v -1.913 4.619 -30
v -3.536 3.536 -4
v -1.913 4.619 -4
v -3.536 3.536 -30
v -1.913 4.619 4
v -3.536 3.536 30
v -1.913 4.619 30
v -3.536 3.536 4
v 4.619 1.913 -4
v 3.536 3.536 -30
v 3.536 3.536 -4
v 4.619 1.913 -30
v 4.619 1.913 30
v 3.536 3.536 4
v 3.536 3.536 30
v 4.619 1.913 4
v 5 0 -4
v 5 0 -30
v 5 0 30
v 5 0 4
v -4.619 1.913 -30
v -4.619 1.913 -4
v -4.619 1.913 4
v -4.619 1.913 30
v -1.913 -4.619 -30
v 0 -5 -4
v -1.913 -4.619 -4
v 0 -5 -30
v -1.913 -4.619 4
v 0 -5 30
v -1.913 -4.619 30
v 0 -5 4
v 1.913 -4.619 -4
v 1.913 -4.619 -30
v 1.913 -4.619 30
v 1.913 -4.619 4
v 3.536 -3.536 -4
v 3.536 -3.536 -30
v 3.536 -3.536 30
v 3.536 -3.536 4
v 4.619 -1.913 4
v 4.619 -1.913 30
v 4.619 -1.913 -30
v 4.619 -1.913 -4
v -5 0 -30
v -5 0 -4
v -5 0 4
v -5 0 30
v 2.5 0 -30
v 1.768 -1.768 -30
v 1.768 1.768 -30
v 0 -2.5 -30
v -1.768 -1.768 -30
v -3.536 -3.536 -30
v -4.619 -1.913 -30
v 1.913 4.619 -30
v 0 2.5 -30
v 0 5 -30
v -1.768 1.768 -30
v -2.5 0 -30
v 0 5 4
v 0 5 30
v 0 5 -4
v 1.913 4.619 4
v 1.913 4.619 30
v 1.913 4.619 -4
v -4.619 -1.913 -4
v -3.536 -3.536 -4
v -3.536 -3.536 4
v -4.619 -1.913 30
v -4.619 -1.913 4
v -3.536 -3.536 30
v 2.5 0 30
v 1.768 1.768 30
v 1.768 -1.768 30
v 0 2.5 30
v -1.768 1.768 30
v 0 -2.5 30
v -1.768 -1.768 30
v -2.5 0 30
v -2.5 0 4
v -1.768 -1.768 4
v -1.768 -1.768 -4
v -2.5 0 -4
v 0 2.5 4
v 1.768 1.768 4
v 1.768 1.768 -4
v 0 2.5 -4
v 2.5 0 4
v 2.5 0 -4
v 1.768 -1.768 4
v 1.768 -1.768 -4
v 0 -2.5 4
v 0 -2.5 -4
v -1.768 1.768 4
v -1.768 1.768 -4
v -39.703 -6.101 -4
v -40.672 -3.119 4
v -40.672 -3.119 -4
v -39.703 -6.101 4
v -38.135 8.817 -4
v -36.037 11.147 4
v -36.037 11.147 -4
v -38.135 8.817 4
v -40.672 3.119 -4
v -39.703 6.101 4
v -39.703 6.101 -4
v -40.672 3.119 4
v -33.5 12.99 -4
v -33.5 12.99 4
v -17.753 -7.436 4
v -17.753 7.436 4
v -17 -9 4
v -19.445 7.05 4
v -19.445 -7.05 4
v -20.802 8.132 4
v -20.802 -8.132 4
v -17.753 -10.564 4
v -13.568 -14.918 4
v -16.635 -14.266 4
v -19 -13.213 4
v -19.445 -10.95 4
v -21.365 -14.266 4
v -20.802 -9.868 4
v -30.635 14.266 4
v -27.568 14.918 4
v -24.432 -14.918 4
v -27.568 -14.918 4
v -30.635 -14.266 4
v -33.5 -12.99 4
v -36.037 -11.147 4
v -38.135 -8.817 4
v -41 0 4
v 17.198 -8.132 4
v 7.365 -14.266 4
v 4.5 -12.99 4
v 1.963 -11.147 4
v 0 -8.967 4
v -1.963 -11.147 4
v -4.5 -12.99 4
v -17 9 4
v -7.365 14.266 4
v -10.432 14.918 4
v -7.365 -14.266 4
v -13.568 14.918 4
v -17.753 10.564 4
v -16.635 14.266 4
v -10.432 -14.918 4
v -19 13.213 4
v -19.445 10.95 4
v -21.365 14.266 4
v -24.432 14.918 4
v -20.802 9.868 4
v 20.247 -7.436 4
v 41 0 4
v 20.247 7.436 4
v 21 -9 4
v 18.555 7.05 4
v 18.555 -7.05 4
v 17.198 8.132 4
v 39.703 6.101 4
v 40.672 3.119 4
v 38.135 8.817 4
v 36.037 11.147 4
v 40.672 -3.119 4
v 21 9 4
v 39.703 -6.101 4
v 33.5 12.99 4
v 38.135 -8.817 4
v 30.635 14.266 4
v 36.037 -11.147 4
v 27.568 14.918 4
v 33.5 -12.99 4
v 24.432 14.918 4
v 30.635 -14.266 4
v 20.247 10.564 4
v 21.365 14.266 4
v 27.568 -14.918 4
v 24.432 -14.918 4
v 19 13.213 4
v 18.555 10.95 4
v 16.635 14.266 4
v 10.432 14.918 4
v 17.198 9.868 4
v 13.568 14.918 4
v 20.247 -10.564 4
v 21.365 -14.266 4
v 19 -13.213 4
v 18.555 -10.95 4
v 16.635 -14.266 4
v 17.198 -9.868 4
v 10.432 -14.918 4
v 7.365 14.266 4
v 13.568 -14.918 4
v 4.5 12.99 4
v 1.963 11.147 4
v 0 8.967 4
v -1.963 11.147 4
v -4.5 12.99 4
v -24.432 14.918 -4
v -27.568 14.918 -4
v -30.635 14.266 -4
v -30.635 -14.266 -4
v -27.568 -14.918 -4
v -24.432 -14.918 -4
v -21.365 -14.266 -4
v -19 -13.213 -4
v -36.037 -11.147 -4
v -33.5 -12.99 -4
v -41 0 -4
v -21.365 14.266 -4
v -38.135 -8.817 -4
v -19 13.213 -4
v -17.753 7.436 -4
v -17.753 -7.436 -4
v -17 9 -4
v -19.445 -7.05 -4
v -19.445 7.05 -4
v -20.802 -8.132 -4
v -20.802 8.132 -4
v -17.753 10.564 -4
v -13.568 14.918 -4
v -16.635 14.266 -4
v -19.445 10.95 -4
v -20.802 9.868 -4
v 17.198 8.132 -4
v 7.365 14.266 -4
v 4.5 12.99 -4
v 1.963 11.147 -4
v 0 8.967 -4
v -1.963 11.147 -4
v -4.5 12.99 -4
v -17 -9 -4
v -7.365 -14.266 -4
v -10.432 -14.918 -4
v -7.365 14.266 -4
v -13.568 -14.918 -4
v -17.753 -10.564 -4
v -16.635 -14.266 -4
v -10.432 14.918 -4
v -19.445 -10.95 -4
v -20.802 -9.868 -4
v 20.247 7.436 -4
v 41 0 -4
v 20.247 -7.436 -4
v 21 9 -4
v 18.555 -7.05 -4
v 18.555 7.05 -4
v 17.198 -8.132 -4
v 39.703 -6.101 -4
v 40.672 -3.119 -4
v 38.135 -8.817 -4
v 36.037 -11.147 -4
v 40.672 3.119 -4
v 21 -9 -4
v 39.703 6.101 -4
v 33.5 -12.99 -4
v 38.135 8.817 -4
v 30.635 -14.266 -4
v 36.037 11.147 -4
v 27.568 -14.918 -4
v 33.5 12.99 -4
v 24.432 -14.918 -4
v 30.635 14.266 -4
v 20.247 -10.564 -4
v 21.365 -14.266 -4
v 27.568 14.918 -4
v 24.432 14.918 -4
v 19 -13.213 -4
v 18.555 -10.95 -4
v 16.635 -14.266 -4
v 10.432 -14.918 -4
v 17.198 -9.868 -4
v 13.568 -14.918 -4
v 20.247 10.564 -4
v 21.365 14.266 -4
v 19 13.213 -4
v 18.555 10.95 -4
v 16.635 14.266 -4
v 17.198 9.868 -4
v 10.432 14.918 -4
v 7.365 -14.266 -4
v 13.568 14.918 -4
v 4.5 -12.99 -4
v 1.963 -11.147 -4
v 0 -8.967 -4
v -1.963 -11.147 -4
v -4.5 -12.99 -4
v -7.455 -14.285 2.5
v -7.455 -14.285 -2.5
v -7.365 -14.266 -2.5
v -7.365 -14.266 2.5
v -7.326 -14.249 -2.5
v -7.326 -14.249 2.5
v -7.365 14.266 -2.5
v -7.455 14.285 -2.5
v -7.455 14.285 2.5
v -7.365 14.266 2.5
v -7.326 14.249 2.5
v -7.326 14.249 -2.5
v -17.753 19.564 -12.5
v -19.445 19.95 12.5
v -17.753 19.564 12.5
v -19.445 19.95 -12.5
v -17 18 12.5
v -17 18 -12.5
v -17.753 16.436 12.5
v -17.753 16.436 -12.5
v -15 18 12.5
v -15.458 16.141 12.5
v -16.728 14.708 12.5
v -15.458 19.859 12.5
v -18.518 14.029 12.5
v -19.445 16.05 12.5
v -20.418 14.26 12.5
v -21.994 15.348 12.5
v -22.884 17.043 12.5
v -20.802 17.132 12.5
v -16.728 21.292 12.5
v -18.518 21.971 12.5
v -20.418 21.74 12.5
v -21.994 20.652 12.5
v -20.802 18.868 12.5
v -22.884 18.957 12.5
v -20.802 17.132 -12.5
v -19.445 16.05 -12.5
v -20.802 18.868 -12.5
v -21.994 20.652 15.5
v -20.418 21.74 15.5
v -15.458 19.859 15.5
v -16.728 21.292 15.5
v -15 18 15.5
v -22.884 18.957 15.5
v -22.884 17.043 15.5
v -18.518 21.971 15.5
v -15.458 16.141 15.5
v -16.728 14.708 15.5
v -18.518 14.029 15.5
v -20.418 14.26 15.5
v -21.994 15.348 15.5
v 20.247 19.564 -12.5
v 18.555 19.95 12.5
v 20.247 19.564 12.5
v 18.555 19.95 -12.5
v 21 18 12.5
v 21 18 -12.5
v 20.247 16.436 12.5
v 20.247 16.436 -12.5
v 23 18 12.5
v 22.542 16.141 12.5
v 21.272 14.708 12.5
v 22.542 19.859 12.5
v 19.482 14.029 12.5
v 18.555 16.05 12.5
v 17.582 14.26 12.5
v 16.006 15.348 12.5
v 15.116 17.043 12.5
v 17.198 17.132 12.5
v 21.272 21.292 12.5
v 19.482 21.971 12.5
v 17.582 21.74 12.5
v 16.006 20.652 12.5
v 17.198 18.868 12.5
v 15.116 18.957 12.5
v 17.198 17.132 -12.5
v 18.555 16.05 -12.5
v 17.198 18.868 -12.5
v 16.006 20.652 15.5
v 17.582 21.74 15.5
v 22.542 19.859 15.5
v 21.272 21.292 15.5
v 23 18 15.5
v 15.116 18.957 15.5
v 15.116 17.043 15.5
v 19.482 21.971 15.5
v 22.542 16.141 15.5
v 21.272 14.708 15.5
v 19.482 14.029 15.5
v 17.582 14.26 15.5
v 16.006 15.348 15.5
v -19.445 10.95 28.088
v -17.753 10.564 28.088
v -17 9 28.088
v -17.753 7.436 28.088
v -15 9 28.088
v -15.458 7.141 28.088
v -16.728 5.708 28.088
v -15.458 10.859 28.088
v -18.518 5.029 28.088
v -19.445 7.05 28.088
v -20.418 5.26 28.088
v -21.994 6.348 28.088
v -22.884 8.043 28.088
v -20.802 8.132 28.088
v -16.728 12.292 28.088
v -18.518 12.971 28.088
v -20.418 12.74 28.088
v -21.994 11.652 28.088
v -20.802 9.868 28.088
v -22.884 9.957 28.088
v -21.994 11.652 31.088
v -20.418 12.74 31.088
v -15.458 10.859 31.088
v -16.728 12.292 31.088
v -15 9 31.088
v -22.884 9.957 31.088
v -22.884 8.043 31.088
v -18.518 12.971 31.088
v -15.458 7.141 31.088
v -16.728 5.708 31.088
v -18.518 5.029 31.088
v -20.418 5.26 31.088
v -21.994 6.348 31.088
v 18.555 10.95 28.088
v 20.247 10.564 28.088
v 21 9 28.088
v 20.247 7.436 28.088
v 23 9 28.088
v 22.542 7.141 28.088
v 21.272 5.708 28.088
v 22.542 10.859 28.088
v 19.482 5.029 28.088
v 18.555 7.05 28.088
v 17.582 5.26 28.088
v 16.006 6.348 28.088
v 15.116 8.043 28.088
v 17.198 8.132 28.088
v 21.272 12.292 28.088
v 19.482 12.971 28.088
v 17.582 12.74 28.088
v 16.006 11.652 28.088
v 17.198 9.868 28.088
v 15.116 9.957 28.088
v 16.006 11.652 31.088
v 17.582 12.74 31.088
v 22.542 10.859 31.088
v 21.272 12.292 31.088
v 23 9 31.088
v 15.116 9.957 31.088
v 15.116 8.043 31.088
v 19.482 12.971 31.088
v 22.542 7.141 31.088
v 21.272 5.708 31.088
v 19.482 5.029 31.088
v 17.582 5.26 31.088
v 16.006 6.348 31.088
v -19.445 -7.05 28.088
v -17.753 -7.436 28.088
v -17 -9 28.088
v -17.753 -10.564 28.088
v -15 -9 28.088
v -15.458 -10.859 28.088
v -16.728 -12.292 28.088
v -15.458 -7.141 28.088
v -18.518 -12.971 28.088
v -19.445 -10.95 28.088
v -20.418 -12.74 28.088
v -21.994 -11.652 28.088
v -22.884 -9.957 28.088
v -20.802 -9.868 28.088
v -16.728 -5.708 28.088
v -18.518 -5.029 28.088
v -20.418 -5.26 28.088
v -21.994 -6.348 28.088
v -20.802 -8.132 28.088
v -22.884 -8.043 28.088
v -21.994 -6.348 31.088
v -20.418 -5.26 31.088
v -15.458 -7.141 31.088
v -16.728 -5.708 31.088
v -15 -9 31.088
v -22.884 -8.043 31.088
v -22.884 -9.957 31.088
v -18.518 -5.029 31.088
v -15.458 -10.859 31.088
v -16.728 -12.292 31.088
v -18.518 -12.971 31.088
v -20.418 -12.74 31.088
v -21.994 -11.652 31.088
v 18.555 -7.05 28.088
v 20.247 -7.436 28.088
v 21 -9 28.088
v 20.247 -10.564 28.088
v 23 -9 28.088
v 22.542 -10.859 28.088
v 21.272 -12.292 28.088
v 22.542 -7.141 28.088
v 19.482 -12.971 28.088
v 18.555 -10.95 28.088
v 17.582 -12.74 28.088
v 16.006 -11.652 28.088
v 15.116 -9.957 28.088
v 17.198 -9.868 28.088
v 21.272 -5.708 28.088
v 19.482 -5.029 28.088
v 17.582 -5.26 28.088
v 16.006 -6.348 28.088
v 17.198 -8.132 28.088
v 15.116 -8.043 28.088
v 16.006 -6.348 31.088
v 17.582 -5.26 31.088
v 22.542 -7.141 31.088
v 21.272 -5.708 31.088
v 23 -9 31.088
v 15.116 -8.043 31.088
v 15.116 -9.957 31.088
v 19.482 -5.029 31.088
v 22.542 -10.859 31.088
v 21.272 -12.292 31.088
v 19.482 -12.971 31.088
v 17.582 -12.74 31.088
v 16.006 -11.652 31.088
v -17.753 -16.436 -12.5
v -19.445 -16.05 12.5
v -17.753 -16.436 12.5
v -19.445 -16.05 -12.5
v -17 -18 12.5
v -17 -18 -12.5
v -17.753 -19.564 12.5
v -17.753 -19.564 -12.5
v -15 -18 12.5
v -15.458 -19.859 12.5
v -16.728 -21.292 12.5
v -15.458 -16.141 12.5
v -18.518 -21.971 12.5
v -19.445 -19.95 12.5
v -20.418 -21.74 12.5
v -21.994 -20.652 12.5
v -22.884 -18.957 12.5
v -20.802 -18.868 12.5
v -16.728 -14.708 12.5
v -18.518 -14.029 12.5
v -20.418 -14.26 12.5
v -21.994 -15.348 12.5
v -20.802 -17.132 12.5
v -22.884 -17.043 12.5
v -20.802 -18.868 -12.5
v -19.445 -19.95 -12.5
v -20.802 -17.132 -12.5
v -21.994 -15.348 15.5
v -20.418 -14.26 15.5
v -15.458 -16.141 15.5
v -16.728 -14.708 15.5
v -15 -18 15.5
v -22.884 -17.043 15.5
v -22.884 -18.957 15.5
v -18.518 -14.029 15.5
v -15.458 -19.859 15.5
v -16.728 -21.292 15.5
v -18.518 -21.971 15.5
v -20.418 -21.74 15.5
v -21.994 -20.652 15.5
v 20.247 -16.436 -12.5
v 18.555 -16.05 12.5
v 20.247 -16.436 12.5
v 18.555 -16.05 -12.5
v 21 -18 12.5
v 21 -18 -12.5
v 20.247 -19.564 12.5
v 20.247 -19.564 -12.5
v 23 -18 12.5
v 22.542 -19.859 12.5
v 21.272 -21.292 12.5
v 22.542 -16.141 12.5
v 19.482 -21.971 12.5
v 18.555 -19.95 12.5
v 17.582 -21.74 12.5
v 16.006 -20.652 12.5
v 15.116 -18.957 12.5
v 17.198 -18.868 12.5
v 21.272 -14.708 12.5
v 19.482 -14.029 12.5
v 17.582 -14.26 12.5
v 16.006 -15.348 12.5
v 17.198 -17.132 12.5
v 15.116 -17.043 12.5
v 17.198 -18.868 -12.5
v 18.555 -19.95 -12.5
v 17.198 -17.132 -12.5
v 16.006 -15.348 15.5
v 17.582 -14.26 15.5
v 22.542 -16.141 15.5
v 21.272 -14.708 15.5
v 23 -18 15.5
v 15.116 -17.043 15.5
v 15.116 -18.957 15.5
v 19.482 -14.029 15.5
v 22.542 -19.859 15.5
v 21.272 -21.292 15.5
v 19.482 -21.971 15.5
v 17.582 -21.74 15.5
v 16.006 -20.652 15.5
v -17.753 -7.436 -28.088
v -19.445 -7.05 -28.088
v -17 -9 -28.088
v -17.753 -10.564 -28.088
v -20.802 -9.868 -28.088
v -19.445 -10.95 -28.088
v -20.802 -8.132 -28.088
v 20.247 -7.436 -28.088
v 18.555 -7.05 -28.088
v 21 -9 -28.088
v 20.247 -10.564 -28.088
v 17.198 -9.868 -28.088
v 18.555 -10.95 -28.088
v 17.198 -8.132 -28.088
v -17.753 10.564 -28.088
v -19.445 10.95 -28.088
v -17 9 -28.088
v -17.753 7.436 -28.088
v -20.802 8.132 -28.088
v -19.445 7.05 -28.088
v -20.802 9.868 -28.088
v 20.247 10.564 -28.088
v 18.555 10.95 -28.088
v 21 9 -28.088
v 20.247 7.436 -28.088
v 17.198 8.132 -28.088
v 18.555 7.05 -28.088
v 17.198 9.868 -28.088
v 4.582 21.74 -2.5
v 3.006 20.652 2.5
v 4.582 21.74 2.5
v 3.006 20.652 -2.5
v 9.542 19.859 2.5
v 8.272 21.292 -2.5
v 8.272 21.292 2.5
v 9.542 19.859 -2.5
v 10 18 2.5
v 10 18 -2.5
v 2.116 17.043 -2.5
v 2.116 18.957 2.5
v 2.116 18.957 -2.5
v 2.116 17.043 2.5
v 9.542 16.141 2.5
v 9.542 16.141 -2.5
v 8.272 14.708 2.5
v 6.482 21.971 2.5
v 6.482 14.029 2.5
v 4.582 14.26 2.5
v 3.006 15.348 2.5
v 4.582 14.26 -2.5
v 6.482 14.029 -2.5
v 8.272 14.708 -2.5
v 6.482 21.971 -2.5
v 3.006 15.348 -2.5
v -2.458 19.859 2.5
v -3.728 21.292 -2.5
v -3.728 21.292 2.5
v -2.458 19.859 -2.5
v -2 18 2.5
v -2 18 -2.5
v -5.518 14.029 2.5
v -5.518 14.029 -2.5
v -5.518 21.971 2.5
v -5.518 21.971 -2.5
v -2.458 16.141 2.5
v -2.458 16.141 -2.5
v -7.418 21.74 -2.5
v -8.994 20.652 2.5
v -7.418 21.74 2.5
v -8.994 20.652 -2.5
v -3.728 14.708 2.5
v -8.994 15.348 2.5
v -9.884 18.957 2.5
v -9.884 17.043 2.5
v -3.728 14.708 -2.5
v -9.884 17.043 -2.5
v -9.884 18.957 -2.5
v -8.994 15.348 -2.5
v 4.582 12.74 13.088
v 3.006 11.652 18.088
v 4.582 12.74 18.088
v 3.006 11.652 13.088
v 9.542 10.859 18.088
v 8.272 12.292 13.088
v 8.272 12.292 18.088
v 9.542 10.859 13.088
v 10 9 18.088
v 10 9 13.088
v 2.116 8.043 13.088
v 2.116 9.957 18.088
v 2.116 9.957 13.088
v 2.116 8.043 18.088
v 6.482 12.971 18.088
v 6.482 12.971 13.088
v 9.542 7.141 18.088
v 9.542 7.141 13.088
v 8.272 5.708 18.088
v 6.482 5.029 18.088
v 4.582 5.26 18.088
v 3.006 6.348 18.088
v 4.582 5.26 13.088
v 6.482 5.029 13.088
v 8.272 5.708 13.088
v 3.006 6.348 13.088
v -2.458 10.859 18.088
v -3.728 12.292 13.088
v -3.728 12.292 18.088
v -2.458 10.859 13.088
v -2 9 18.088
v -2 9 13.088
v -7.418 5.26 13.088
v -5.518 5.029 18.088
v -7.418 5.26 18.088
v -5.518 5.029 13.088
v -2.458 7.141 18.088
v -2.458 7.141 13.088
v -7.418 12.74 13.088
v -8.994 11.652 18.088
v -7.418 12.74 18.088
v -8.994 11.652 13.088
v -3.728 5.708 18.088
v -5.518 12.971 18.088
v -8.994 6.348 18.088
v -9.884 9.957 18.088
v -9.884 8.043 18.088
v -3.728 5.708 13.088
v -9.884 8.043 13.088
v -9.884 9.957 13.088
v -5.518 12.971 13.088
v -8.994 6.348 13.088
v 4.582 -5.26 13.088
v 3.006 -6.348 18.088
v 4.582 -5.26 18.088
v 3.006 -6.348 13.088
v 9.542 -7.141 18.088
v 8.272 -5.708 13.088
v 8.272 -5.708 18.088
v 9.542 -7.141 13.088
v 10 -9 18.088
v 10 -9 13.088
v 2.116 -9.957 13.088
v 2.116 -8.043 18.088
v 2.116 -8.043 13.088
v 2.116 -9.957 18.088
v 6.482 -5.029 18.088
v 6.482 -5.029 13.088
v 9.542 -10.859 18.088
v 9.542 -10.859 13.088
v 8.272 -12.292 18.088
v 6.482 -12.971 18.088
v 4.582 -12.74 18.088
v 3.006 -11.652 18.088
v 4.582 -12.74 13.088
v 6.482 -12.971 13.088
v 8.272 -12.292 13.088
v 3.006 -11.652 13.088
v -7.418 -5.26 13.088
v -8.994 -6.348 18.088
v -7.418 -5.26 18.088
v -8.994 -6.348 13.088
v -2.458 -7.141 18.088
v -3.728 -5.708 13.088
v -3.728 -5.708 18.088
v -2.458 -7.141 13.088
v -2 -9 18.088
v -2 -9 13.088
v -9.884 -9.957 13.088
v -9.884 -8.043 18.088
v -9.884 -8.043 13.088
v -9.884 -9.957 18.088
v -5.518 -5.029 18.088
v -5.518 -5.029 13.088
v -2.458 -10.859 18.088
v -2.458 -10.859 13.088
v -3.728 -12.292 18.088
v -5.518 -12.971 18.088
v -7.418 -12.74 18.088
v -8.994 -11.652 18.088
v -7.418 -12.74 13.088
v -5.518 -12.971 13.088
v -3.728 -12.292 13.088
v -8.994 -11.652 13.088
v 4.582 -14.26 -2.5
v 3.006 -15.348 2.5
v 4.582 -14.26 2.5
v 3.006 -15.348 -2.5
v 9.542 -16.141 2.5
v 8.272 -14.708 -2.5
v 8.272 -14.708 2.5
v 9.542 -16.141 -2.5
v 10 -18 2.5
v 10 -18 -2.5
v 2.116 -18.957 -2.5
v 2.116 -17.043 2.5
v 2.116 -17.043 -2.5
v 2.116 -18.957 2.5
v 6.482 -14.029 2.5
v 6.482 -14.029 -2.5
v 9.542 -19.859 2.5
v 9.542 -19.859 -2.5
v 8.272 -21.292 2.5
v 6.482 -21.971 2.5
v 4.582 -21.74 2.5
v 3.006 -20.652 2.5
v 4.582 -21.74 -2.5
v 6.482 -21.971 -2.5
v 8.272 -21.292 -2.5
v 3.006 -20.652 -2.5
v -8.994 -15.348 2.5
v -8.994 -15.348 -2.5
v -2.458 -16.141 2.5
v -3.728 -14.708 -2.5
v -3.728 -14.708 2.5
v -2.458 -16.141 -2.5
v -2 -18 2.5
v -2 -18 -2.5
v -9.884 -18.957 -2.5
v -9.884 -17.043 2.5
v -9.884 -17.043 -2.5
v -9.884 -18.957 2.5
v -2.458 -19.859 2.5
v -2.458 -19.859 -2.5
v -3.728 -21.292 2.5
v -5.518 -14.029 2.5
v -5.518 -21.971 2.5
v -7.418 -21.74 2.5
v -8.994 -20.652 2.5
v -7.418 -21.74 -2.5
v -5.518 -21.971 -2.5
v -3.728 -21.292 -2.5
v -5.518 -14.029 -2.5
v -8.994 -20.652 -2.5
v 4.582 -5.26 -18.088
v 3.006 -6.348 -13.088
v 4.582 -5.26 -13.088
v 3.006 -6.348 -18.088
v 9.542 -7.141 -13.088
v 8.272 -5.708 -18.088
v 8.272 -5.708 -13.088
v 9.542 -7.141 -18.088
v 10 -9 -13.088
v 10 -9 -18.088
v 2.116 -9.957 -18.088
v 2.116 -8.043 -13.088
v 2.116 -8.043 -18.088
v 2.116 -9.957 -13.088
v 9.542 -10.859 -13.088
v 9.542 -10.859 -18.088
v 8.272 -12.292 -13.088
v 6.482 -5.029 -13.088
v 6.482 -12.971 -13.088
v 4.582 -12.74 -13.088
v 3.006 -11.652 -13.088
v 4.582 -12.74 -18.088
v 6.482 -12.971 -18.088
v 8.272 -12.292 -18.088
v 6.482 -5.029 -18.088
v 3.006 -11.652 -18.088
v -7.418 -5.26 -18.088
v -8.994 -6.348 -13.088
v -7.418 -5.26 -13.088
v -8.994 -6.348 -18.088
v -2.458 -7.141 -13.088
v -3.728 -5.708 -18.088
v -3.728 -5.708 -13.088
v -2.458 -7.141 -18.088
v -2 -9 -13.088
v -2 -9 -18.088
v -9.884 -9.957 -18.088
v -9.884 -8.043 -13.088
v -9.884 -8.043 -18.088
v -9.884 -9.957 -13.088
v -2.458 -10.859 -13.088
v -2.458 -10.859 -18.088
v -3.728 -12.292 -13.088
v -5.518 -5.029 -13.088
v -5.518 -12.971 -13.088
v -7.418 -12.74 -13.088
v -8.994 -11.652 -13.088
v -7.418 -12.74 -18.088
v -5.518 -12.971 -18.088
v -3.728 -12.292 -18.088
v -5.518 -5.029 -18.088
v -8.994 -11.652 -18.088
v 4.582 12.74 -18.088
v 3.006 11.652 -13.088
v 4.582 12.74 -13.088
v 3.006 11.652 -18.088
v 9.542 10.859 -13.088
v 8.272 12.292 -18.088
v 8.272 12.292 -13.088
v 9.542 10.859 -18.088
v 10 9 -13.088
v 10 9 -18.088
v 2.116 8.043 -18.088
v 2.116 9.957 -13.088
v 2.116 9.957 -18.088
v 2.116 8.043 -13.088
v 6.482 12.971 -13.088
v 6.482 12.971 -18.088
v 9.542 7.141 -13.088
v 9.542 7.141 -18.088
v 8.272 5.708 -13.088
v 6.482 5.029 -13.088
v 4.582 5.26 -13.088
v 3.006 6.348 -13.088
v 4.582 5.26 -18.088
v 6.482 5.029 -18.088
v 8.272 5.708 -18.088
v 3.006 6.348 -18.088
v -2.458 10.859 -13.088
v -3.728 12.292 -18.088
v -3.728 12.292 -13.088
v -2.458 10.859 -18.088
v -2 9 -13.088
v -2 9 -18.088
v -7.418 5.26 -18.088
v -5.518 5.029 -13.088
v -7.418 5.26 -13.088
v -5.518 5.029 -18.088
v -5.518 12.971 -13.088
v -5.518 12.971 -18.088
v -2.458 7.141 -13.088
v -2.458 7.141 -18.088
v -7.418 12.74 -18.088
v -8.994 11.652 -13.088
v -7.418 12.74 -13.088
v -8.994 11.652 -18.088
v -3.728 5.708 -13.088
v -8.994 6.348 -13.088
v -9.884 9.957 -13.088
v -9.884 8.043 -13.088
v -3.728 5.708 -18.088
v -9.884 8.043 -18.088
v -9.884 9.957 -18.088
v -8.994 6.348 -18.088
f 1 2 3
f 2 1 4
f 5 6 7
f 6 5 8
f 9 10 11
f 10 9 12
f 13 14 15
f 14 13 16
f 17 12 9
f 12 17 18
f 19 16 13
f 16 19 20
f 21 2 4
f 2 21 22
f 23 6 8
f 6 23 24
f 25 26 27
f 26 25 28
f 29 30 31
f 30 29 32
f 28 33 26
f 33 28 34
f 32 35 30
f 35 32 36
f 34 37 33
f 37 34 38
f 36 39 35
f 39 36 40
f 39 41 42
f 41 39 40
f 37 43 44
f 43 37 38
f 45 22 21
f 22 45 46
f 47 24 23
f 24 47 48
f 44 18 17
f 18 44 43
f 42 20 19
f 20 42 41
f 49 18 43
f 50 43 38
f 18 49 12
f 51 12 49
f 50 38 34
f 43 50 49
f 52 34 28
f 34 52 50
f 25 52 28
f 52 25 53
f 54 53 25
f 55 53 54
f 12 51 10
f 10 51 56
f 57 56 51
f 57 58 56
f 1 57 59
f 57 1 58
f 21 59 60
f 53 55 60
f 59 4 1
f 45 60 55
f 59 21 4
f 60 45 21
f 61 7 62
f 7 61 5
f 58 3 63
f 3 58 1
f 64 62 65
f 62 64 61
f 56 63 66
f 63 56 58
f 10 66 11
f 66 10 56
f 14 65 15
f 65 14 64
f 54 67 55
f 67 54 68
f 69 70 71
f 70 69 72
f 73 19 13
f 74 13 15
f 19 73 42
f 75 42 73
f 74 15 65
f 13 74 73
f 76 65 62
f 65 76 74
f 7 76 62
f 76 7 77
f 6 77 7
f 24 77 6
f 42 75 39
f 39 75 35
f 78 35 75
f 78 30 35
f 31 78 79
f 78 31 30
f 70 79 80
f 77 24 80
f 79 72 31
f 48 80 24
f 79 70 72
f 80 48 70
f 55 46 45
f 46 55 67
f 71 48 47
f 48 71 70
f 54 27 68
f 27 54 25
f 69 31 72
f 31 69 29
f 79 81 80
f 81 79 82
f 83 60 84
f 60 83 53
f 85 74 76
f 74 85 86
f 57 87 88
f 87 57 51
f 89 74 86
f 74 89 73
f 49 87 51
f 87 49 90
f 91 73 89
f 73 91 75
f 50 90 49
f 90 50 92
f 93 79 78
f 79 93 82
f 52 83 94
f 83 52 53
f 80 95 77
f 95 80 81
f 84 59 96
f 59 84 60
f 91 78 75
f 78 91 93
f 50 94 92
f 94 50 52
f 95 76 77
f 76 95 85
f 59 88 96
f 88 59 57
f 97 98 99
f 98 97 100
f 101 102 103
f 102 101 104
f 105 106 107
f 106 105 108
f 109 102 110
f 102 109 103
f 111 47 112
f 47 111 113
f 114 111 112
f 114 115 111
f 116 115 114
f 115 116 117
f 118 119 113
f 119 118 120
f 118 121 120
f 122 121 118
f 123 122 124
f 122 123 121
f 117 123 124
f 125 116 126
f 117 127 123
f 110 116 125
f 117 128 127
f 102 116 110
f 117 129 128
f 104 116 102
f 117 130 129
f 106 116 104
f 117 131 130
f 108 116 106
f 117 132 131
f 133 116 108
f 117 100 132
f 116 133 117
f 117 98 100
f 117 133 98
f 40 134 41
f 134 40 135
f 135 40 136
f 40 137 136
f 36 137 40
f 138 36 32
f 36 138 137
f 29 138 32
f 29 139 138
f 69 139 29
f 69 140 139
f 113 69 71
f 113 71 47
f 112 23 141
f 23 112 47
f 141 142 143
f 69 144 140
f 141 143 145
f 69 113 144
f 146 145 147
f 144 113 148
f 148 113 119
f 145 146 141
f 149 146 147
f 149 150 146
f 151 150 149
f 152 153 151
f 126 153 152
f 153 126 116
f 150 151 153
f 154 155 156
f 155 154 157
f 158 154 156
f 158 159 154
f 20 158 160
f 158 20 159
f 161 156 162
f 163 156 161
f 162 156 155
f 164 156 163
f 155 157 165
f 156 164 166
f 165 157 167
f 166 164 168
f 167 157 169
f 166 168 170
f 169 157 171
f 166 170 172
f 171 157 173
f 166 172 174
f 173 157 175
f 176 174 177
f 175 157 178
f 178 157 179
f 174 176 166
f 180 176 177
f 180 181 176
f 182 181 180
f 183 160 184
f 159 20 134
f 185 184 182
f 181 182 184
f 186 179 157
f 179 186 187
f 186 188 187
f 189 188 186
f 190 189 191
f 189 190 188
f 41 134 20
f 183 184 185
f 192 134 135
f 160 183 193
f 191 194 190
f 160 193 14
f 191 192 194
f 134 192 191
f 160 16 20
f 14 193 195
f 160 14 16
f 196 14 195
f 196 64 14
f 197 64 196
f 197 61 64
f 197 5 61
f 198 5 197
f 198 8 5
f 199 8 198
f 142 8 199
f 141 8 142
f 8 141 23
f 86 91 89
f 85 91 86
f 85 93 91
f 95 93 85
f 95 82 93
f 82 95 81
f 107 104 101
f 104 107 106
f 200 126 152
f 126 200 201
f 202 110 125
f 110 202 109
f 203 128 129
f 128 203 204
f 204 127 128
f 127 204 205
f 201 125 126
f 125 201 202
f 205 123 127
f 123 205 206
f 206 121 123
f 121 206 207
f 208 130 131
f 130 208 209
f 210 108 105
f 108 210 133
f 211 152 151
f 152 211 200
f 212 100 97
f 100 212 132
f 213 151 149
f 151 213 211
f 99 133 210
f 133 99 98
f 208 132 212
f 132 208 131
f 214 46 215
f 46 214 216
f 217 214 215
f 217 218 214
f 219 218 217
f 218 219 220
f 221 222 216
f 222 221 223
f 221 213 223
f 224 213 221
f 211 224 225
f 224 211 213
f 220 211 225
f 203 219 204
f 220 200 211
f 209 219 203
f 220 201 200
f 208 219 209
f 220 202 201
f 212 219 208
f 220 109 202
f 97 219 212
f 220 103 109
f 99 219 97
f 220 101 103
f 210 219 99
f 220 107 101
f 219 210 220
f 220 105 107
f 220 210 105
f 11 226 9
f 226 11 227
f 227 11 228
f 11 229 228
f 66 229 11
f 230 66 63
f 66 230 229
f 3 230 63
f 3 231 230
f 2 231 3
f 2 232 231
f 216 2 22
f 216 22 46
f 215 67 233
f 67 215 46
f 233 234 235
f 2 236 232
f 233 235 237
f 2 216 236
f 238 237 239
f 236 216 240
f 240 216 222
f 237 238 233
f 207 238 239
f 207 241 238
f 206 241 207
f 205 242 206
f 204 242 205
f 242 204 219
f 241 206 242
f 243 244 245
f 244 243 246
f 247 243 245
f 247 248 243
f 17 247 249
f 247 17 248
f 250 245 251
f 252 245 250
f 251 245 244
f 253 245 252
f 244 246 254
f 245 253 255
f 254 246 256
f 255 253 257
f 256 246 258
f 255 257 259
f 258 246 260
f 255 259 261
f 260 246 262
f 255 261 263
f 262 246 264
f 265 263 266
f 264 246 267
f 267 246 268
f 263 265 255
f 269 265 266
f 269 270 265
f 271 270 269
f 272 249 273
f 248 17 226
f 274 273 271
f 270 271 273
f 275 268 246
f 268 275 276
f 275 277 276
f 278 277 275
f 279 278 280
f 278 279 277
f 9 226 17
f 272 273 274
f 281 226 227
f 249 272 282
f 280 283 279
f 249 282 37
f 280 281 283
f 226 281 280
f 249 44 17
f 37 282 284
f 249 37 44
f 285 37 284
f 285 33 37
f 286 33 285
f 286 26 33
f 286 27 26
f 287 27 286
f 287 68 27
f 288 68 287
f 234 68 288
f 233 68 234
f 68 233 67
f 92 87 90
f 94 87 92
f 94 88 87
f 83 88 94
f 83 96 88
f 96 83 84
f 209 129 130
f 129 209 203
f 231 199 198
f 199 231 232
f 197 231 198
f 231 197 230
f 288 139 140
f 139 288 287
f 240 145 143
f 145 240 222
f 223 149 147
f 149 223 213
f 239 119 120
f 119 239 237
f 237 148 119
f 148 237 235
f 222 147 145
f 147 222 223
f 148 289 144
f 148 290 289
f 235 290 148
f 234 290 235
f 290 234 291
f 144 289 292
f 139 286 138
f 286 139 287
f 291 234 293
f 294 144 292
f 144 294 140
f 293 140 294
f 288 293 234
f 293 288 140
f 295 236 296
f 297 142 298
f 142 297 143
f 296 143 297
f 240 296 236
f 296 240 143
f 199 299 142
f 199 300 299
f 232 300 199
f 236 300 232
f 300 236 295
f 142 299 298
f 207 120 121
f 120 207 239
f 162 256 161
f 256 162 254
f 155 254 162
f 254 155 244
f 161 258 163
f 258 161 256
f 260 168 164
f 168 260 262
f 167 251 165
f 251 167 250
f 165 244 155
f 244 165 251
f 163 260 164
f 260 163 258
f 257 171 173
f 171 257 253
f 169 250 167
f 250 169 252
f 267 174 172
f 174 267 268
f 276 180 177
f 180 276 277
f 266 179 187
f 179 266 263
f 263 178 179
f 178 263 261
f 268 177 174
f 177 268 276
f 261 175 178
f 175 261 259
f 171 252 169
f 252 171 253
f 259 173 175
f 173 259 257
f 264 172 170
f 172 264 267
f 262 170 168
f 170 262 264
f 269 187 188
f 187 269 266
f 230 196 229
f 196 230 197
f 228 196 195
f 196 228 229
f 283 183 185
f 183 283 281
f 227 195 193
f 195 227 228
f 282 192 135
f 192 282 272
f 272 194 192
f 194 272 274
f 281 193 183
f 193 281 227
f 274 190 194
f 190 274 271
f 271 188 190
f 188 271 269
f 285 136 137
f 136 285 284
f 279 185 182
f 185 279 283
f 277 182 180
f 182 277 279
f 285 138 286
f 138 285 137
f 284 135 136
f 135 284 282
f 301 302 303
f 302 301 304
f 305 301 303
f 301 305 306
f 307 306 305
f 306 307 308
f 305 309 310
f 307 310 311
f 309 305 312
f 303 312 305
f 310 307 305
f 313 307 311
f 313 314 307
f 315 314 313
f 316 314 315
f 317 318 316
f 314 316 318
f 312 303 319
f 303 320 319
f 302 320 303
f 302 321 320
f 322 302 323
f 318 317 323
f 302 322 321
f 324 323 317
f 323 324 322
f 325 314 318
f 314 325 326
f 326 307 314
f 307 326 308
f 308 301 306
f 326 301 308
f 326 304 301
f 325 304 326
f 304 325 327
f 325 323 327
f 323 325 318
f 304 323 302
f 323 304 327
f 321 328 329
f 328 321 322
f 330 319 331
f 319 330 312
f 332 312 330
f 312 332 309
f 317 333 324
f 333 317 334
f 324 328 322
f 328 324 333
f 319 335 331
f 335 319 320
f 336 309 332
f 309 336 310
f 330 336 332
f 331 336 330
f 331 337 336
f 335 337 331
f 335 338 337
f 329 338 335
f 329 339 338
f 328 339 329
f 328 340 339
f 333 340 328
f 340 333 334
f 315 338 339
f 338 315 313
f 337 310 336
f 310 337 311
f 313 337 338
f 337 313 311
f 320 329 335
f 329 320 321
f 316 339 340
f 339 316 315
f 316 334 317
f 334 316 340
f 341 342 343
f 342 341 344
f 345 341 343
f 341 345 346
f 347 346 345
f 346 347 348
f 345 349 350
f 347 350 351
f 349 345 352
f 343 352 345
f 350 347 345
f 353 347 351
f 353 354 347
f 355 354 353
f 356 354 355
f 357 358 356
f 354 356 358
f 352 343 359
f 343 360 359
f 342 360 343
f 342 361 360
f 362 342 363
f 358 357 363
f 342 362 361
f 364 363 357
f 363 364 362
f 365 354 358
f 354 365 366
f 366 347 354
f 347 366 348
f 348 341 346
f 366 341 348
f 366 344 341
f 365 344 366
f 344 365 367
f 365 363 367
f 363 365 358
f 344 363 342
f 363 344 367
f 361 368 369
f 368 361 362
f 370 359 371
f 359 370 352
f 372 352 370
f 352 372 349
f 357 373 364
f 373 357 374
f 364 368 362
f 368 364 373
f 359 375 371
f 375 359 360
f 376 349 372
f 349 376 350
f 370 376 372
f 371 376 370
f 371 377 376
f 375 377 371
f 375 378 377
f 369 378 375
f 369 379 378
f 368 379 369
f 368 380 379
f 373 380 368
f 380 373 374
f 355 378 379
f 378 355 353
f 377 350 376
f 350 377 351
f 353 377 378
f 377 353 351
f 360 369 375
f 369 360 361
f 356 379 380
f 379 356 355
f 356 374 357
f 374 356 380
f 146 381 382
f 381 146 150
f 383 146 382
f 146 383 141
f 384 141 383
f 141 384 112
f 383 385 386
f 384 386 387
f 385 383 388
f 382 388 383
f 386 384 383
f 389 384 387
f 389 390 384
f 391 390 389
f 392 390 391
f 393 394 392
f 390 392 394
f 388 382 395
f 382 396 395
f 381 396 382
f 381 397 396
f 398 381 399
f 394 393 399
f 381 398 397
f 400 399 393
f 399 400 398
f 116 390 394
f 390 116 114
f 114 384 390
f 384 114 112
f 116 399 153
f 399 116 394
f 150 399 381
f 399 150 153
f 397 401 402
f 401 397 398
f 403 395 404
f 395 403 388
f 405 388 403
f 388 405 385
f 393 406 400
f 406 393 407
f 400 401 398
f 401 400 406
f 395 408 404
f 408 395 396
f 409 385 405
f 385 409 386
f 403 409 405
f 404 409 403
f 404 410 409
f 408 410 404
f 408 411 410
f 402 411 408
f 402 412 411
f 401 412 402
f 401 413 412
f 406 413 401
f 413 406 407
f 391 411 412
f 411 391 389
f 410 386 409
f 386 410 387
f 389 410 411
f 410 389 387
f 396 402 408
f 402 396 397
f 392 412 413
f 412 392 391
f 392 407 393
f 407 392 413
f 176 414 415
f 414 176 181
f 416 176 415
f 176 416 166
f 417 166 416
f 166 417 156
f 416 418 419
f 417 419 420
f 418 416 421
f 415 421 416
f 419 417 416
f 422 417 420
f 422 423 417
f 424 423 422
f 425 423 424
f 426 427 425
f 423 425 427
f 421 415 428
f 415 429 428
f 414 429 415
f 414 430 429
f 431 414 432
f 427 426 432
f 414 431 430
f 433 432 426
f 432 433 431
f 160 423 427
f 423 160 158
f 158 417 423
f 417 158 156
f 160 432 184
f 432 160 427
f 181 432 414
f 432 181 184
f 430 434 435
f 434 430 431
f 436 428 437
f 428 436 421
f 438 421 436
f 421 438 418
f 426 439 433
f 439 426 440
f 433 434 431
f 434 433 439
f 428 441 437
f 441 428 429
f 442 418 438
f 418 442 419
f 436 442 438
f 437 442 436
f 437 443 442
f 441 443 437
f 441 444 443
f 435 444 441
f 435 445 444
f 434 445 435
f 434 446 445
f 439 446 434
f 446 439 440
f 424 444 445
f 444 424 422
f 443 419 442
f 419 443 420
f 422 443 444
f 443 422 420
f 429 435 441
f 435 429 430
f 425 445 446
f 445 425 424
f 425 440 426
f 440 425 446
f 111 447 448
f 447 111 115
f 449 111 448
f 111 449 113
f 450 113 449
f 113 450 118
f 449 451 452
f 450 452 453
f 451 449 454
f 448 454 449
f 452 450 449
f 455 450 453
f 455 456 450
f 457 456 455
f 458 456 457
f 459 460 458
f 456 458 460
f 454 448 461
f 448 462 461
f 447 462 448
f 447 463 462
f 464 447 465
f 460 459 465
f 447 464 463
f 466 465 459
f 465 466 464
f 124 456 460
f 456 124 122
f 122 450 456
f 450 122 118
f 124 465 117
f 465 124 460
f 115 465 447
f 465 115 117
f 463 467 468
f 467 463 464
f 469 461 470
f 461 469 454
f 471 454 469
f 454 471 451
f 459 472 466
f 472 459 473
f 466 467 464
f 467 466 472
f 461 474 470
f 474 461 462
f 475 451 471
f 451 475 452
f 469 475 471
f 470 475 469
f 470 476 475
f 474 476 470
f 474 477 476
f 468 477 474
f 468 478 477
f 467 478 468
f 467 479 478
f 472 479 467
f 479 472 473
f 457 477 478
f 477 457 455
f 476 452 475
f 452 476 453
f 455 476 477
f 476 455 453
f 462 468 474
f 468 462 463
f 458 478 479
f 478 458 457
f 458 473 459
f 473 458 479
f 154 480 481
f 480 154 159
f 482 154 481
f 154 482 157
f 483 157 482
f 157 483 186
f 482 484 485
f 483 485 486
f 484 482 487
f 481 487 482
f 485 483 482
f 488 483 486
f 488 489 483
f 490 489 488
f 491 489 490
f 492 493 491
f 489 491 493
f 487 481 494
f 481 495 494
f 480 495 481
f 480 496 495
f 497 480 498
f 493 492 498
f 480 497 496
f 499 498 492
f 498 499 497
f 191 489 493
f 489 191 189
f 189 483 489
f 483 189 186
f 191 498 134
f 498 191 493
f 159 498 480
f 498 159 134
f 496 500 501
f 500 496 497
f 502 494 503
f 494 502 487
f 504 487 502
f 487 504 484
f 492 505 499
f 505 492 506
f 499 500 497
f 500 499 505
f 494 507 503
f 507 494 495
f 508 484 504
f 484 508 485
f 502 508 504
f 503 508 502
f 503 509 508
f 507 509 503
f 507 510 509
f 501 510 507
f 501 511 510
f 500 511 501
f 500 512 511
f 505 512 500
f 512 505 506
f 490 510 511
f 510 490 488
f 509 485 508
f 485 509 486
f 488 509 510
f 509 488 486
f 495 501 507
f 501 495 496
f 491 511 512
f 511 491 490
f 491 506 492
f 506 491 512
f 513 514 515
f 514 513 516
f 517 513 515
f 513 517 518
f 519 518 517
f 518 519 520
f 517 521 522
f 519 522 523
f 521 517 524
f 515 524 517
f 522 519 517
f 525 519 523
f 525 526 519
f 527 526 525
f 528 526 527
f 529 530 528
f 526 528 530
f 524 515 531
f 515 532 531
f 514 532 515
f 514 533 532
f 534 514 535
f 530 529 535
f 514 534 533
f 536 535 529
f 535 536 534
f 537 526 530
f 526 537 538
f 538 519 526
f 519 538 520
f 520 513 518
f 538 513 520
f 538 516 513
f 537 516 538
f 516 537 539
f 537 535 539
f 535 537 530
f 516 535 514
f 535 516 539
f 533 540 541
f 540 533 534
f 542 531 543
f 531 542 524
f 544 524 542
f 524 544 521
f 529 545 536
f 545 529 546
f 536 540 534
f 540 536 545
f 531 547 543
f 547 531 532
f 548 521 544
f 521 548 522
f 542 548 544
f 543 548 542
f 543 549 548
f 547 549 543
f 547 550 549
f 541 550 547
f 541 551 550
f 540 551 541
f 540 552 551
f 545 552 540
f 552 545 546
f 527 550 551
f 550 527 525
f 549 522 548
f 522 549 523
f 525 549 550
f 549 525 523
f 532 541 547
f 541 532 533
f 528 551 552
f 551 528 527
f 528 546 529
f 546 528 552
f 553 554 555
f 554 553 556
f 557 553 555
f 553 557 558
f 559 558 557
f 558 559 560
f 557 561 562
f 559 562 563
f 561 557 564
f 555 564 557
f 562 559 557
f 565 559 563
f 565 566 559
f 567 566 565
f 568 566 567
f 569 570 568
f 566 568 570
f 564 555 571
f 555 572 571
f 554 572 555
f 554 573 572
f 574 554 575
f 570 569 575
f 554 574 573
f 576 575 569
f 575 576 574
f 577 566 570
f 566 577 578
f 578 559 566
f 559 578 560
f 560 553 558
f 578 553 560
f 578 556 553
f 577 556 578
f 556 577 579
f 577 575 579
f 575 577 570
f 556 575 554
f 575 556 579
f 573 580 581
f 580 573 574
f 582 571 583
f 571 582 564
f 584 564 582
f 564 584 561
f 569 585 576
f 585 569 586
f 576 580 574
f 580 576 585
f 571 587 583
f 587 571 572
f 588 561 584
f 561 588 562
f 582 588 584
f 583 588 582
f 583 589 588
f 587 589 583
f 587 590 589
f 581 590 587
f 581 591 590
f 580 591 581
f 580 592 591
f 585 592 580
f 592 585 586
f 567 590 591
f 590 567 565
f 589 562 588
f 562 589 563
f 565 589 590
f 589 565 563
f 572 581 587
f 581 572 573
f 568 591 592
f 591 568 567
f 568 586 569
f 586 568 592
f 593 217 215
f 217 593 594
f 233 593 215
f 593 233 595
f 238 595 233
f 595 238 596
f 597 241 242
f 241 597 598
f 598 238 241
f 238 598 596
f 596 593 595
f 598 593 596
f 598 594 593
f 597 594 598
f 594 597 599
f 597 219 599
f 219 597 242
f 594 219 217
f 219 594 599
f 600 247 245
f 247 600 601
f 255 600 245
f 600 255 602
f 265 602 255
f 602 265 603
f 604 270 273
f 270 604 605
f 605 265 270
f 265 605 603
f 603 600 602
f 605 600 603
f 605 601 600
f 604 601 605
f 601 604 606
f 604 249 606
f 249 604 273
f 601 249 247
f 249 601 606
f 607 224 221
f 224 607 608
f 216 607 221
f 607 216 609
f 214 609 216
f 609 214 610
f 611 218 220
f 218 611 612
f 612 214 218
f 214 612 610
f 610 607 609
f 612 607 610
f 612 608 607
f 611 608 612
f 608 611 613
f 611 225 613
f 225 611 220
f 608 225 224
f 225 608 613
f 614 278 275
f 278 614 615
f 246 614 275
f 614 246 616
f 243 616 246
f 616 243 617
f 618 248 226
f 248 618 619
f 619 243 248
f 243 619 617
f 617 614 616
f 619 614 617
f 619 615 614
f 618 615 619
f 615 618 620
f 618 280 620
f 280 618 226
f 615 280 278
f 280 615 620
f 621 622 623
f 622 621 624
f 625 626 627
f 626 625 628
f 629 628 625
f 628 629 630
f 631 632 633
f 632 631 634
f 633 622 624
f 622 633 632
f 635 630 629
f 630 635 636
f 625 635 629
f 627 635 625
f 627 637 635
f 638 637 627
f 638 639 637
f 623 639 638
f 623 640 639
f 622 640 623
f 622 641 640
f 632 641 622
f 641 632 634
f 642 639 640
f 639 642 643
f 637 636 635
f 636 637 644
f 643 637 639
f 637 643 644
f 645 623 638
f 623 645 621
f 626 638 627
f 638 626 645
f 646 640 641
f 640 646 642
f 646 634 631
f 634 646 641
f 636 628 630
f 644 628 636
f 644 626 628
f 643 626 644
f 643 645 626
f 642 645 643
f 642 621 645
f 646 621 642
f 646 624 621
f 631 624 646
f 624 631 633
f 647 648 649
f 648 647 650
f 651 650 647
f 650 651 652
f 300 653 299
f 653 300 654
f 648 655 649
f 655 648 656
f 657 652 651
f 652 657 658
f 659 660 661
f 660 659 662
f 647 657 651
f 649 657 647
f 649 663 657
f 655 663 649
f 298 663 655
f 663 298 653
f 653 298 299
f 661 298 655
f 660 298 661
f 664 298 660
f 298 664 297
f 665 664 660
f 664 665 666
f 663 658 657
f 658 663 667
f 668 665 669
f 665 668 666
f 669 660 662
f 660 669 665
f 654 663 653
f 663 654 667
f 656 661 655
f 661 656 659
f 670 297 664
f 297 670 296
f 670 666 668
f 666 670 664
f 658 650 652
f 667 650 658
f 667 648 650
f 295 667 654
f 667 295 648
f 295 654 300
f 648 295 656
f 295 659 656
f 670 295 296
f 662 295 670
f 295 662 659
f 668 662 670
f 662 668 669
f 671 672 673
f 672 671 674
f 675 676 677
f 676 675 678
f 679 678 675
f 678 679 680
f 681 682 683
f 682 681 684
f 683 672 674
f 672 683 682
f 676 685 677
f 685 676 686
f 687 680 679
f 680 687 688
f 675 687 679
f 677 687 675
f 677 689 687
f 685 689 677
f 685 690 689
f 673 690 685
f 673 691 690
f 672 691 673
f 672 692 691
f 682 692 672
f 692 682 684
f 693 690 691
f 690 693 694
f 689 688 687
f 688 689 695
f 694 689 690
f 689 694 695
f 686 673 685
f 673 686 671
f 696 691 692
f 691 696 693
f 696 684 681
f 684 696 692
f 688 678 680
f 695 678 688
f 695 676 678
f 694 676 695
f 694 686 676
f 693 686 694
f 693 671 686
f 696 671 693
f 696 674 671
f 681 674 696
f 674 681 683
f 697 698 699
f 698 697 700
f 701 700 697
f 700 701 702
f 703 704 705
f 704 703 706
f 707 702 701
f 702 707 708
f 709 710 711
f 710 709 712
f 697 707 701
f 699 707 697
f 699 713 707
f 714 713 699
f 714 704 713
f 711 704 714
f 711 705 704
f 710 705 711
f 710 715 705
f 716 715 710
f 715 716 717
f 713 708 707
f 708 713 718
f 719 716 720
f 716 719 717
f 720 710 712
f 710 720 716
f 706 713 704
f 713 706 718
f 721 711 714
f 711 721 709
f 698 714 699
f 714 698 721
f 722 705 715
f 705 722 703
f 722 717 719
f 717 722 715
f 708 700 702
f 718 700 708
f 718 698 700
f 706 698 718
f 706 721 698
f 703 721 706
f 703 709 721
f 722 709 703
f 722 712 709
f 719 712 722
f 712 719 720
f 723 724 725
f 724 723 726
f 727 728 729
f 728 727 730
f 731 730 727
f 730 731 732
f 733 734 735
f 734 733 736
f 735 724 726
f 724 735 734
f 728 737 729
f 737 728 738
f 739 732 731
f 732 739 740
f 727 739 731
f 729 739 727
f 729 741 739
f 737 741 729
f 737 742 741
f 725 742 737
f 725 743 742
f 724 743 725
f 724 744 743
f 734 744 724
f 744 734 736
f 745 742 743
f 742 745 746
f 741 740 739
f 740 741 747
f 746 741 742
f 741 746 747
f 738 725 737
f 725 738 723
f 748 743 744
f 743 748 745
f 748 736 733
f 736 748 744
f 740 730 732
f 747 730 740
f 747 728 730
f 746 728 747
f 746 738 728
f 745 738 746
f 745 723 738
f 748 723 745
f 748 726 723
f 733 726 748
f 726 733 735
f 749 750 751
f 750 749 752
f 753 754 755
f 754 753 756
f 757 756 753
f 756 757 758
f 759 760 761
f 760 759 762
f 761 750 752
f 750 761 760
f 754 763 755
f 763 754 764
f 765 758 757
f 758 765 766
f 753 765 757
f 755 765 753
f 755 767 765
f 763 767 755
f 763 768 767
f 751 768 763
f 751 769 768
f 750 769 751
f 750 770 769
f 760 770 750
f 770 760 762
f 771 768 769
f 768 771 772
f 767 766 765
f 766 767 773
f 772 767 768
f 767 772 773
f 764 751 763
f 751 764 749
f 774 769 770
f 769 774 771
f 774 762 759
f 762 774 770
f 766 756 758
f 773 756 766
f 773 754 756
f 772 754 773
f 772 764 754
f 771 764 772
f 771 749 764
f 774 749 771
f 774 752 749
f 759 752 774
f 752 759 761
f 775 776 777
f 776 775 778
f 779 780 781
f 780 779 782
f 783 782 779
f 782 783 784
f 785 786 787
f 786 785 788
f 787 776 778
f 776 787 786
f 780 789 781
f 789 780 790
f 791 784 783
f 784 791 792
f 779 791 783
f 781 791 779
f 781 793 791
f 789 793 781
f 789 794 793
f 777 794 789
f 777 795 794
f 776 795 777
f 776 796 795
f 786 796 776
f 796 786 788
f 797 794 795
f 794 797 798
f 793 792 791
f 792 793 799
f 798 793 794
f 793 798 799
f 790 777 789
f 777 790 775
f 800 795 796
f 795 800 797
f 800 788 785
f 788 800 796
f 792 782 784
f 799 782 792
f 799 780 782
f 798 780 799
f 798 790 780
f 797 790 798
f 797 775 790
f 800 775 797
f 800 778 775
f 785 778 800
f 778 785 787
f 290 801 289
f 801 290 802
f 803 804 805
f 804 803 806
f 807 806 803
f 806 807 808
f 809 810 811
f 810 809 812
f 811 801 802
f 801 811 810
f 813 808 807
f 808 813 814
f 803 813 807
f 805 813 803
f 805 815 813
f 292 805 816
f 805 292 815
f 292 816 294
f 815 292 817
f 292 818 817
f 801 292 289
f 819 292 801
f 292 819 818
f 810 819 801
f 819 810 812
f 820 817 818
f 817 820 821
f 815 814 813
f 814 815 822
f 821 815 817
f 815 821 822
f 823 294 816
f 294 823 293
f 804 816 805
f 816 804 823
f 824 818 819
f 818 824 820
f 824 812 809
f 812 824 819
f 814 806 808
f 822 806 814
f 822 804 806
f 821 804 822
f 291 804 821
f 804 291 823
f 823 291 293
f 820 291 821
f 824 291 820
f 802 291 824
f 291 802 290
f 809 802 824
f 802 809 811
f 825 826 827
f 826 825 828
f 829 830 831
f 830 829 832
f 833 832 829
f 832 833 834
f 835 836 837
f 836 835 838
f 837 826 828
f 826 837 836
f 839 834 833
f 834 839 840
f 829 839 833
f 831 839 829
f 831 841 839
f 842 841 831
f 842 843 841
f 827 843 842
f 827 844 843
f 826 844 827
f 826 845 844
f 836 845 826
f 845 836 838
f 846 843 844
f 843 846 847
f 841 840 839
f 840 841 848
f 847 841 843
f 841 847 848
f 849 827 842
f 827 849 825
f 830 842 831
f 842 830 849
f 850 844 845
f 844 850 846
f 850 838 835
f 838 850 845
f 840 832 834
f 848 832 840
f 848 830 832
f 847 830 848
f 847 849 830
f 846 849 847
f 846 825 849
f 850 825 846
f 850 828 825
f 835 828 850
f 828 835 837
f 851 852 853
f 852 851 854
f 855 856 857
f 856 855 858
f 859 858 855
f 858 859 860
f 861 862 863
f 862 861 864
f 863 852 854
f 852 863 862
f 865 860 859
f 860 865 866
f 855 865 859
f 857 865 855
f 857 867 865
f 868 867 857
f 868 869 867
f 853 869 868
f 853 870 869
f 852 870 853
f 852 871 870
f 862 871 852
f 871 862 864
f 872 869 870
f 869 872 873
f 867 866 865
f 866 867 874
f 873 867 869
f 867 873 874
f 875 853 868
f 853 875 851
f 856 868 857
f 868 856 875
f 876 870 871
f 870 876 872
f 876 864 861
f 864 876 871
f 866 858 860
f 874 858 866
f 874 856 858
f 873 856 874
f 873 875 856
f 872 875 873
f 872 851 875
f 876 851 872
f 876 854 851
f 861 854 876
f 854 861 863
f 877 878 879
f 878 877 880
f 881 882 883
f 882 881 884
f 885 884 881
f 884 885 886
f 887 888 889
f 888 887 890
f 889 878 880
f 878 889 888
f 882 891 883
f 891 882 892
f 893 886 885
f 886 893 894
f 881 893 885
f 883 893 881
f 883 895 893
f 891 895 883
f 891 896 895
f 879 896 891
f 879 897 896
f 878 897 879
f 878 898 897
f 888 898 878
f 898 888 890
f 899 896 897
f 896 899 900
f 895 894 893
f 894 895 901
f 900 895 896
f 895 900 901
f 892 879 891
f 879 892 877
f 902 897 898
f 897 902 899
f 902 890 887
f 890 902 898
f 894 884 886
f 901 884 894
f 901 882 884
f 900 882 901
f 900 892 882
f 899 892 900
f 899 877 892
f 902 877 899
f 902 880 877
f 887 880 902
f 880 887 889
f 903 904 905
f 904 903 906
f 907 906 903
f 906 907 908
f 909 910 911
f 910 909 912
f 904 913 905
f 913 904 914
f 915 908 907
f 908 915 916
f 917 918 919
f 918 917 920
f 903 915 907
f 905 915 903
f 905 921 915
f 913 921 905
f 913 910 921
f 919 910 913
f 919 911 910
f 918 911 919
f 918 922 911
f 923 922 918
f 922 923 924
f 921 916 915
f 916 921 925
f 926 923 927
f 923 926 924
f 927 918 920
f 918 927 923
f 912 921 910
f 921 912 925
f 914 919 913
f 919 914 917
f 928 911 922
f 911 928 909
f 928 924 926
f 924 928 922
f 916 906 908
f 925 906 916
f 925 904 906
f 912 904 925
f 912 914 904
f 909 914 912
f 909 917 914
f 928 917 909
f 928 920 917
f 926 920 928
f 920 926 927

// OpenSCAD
// Parameters
shaft_diameter = 10; // Adjusted to match original model
shaft_length = 60; // Extended for proper alignment
flange_diameter = 30; // Adjusted to match original model
flange_thickness = 8; // Increased thickness for proper proportion
spacer_diameter = 25; // Increased to match original model
spacer_thickness = 6; // Adjusted for correct separation
bolt_diameter = 4; // Adjusted for better fit
bolt_length = 25; // Extended for proper securing
nut_diameter = 8; // Adjusted for proper fit
nut_thickness = 5; // Adjusted for correct proportion
hole_spacing = 18; // Adjusted for correct bolt placement
num_bolts = 6; // Increased to match original model

// Function to create a continuous central shaft with a hole
module shaft_with_hole(length) {
    difference() {
        cylinder(h=length, d=shaft_diameter, center=true);
        cylinder(h=length+2, d=5, center=true); // Central hole
    }
}

// Function to create a flange plate
module flange_plate() {
    difference() {
        cylinder(h=flange_thickness, d=flange_diameter, center=true);
        for (i = [0:num_bolts-1]) {
            angle = i * 360 / num_bolts;
            translate([hole_spacing * cos(angle), hole_spacing * sin(angle), 0])
                cylinder(h=flange_thickness+2, d=bolt_diameter, center=true);
        }
    }
}

// Function to create a spacer ring
module spacer_ring() {
    difference() {
        cylinder(h=spacer_thickness, d=spacer_diameter, center=true);
        for (i = [0:num_bolts-1]) {
            angle = i * 360 / num_bolts;
            translate([hole_spacing * cos(angle), hole_spacing * sin(angle), 0])
                cylinder(h=spacer_thickness+2, d=bolt_diameter, center=true);
        }
    }
}

// Function to create a bolt with a hexagonal head
module bolt() {
    translate([0, 0, -bolt_length/2])
        cylinder(h=bolt_length, d=bolt_diameter, center=false);
    translate([0, 0, bolt_length/2])
        cylinder(h=3, d1=8, d2=8, center=false); // Hexagonal head
}

// Function to create a nut
module nut() {
    cylinder(h=nut_thickness, d=nut_diameter, center=true);
}

// Assembly
module flexible_coupling() {
    shaft_with_hole(shaft_length); // Continuous central shaft

    // Left shaft connection
    translate([-shaft_length/2 + flange_thickness/2, 0, 0]) flange_plate();
    translate([-shaft_length/2 + flange_thickness + spacer_thickness/2, 0, 0]) spacer_ring();
    translate([-shaft_length/2 + flange_thickness + spacer_thickness + flange_thickness/2, 0, 0]) flange_plate();

    // Right shaft connection
    translate([shaft_length/2 - flange_thickness/2, 0, 0]) flange_plate();
    translate([shaft_length/2 - flange_thickness - spacer_thickness/2, 0, 0]) spacer_ring();
    translate([shaft_length/2 - flange_thickness - spacer_thickness - flange_thickness/2, 0, 0]) flange_plate();

    // Bolts and nuts
    for (i = [0:num_bolts-1]) {
        angle = i * 360 / num_bolts;
        translate([-shaft_length/2 + flange_thickness + spacer_thickness/2, hole_spacing * cos(angle), hole_spacing * sin(angle)])
            bolt();
        translate([shaft_length/2 - flange_thickness - spacer_thickness/2, hole_spacing * cos(angle), hole_spacing * sin(angle)])
            bolt();
    }

    for (i = [0:num_bolts-1]) {
        angle = i * 360 / num_bolts;
        translate([-shaft_length/2 + flange_thickness + spacer_thickness/2 + bolt_length, hole_spacing * cos(angle), hole_spacing * sin(angle)])
            nut();
        translate([shaft_length/2 - flange_thickness - spacer_thickness/2 - bolt_length, hole_spacing * cos(angle), hole_spacing * sin(angle)])
            nut();
    }
}

// Render the model
flexible_coupling();
